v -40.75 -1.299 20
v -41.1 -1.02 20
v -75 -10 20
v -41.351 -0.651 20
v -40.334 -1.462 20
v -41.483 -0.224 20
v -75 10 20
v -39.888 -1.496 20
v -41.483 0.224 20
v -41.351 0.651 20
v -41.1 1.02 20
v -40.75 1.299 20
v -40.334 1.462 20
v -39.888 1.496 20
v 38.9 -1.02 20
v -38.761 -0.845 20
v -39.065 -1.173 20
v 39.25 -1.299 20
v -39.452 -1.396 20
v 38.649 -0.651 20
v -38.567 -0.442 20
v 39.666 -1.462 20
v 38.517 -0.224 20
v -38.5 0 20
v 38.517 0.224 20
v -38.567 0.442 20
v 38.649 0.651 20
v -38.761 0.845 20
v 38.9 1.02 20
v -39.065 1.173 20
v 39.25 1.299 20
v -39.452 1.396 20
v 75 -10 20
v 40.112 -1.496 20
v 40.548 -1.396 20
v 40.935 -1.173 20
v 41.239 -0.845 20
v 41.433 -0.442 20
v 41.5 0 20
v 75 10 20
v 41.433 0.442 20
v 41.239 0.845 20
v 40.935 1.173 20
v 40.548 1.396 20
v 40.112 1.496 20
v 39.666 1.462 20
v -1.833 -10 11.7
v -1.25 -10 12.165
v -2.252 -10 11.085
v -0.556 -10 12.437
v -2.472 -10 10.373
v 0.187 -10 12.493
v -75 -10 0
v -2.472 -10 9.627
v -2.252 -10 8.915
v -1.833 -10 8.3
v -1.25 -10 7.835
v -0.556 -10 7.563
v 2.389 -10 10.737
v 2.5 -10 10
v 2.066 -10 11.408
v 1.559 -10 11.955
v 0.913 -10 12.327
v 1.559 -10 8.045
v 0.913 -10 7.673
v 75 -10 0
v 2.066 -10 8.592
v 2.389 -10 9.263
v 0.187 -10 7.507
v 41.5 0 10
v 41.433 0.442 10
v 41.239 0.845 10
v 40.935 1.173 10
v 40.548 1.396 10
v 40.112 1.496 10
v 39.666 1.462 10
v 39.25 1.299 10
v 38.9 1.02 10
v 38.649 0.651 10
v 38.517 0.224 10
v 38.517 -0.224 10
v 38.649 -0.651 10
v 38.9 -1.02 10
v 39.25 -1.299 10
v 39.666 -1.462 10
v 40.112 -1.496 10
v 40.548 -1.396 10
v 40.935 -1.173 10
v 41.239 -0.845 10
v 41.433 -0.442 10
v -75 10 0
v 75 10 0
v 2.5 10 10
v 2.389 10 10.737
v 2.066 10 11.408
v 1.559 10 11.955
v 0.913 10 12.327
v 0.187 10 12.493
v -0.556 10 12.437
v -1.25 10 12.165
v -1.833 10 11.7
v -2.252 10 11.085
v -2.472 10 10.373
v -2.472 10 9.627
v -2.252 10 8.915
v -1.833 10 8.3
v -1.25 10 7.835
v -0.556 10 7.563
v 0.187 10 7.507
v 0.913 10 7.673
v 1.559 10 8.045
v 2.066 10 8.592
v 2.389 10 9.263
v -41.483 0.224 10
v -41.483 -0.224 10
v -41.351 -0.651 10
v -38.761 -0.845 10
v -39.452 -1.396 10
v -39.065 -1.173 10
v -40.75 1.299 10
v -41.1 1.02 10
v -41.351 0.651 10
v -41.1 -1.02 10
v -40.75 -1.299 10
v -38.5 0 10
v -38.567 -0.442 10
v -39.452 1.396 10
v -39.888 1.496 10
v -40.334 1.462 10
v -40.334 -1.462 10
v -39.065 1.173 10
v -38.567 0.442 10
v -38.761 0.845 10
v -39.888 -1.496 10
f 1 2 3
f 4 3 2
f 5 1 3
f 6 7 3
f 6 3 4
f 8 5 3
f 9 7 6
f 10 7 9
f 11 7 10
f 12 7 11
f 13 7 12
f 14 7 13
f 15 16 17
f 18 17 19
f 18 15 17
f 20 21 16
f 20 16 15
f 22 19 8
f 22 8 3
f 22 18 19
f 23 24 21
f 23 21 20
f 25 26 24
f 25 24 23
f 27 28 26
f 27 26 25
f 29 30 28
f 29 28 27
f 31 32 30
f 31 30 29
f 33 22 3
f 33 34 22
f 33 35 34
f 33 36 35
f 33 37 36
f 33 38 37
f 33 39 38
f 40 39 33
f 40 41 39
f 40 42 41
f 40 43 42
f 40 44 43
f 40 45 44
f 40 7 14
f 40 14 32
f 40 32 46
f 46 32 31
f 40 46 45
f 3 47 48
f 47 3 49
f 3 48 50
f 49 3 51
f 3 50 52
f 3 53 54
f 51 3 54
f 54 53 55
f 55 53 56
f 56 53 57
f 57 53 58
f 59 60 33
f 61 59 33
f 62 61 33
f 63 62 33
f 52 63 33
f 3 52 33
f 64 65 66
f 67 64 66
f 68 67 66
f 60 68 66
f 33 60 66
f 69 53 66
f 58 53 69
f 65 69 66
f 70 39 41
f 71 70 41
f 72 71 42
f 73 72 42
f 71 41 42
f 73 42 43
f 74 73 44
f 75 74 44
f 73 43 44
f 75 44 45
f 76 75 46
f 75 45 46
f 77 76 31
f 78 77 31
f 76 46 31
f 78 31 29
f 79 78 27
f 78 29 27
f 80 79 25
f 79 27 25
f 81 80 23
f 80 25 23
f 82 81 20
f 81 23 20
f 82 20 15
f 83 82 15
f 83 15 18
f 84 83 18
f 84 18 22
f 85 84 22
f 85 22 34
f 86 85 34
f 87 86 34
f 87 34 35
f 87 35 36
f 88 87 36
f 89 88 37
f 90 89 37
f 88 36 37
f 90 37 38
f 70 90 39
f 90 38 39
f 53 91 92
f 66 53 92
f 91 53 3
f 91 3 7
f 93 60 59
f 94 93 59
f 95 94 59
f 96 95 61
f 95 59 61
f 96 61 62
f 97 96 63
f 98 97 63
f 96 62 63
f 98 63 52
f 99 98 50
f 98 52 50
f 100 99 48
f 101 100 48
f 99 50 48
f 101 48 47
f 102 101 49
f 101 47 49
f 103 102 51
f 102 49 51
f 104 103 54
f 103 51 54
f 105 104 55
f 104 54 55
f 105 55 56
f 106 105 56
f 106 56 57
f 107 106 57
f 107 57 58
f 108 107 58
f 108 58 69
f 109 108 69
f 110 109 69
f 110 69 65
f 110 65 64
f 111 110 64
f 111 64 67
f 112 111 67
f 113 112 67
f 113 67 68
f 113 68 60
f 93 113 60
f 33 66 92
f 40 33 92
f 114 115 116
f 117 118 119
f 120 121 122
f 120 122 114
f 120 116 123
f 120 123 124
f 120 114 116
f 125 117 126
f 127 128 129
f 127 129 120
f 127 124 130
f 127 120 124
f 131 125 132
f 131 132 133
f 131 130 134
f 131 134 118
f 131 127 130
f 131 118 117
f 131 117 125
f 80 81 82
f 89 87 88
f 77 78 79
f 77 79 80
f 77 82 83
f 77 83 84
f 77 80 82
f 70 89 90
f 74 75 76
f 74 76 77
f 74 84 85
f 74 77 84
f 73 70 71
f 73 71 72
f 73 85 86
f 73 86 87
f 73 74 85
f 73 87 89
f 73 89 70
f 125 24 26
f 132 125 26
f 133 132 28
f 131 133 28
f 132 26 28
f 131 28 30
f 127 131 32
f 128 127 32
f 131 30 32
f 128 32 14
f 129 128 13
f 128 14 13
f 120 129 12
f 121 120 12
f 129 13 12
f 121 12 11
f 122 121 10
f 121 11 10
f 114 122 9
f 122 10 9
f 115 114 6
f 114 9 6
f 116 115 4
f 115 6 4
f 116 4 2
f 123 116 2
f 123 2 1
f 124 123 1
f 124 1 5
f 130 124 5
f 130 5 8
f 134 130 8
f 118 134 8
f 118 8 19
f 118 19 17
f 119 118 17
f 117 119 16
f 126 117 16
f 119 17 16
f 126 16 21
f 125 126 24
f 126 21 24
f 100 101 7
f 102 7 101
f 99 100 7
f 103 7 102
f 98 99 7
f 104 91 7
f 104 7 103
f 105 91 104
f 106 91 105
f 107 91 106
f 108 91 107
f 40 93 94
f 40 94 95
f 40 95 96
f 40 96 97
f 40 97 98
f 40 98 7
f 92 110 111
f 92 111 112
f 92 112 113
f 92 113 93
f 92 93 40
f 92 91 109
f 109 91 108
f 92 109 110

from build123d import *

# Parameters (mm, degrees)
F0_W     = 150
F0_H     = 20
F1_DEPTH = 20
F2_R     = 1.5
F3_DEPTH = 10
F4_R     = 2.5
F5_DEPTH = 25


with BuildPart() as f1:
    # F0 (on Top) → F1 (new body)
    with BuildSketch(Plane.XY):
        Rectangle(F0_W, F0_H)
    extrude(amount=F1_DEPTH)

    # F2 (on face) → F3 (cut)
    with BuildSketch(Plane.XY.offset(20)):
        with Locations((40, 0)):
            Circle(F2_R)
        with Locations((-40, 0)):
            Circle(F2_R)
    extrude(amount=-F3_DEPTH, mode=Mode.SUBTRACT)

    # F4 (on face) → F5 (cut)
    with BuildSketch(Plane.XZ.offset(10)):
        with Locations((0, 10)):
            Circle(F4_R)
    extrude(amount=-F5_DEPTH, mode=Mode.SUBTRACT)


solid = f1.part
